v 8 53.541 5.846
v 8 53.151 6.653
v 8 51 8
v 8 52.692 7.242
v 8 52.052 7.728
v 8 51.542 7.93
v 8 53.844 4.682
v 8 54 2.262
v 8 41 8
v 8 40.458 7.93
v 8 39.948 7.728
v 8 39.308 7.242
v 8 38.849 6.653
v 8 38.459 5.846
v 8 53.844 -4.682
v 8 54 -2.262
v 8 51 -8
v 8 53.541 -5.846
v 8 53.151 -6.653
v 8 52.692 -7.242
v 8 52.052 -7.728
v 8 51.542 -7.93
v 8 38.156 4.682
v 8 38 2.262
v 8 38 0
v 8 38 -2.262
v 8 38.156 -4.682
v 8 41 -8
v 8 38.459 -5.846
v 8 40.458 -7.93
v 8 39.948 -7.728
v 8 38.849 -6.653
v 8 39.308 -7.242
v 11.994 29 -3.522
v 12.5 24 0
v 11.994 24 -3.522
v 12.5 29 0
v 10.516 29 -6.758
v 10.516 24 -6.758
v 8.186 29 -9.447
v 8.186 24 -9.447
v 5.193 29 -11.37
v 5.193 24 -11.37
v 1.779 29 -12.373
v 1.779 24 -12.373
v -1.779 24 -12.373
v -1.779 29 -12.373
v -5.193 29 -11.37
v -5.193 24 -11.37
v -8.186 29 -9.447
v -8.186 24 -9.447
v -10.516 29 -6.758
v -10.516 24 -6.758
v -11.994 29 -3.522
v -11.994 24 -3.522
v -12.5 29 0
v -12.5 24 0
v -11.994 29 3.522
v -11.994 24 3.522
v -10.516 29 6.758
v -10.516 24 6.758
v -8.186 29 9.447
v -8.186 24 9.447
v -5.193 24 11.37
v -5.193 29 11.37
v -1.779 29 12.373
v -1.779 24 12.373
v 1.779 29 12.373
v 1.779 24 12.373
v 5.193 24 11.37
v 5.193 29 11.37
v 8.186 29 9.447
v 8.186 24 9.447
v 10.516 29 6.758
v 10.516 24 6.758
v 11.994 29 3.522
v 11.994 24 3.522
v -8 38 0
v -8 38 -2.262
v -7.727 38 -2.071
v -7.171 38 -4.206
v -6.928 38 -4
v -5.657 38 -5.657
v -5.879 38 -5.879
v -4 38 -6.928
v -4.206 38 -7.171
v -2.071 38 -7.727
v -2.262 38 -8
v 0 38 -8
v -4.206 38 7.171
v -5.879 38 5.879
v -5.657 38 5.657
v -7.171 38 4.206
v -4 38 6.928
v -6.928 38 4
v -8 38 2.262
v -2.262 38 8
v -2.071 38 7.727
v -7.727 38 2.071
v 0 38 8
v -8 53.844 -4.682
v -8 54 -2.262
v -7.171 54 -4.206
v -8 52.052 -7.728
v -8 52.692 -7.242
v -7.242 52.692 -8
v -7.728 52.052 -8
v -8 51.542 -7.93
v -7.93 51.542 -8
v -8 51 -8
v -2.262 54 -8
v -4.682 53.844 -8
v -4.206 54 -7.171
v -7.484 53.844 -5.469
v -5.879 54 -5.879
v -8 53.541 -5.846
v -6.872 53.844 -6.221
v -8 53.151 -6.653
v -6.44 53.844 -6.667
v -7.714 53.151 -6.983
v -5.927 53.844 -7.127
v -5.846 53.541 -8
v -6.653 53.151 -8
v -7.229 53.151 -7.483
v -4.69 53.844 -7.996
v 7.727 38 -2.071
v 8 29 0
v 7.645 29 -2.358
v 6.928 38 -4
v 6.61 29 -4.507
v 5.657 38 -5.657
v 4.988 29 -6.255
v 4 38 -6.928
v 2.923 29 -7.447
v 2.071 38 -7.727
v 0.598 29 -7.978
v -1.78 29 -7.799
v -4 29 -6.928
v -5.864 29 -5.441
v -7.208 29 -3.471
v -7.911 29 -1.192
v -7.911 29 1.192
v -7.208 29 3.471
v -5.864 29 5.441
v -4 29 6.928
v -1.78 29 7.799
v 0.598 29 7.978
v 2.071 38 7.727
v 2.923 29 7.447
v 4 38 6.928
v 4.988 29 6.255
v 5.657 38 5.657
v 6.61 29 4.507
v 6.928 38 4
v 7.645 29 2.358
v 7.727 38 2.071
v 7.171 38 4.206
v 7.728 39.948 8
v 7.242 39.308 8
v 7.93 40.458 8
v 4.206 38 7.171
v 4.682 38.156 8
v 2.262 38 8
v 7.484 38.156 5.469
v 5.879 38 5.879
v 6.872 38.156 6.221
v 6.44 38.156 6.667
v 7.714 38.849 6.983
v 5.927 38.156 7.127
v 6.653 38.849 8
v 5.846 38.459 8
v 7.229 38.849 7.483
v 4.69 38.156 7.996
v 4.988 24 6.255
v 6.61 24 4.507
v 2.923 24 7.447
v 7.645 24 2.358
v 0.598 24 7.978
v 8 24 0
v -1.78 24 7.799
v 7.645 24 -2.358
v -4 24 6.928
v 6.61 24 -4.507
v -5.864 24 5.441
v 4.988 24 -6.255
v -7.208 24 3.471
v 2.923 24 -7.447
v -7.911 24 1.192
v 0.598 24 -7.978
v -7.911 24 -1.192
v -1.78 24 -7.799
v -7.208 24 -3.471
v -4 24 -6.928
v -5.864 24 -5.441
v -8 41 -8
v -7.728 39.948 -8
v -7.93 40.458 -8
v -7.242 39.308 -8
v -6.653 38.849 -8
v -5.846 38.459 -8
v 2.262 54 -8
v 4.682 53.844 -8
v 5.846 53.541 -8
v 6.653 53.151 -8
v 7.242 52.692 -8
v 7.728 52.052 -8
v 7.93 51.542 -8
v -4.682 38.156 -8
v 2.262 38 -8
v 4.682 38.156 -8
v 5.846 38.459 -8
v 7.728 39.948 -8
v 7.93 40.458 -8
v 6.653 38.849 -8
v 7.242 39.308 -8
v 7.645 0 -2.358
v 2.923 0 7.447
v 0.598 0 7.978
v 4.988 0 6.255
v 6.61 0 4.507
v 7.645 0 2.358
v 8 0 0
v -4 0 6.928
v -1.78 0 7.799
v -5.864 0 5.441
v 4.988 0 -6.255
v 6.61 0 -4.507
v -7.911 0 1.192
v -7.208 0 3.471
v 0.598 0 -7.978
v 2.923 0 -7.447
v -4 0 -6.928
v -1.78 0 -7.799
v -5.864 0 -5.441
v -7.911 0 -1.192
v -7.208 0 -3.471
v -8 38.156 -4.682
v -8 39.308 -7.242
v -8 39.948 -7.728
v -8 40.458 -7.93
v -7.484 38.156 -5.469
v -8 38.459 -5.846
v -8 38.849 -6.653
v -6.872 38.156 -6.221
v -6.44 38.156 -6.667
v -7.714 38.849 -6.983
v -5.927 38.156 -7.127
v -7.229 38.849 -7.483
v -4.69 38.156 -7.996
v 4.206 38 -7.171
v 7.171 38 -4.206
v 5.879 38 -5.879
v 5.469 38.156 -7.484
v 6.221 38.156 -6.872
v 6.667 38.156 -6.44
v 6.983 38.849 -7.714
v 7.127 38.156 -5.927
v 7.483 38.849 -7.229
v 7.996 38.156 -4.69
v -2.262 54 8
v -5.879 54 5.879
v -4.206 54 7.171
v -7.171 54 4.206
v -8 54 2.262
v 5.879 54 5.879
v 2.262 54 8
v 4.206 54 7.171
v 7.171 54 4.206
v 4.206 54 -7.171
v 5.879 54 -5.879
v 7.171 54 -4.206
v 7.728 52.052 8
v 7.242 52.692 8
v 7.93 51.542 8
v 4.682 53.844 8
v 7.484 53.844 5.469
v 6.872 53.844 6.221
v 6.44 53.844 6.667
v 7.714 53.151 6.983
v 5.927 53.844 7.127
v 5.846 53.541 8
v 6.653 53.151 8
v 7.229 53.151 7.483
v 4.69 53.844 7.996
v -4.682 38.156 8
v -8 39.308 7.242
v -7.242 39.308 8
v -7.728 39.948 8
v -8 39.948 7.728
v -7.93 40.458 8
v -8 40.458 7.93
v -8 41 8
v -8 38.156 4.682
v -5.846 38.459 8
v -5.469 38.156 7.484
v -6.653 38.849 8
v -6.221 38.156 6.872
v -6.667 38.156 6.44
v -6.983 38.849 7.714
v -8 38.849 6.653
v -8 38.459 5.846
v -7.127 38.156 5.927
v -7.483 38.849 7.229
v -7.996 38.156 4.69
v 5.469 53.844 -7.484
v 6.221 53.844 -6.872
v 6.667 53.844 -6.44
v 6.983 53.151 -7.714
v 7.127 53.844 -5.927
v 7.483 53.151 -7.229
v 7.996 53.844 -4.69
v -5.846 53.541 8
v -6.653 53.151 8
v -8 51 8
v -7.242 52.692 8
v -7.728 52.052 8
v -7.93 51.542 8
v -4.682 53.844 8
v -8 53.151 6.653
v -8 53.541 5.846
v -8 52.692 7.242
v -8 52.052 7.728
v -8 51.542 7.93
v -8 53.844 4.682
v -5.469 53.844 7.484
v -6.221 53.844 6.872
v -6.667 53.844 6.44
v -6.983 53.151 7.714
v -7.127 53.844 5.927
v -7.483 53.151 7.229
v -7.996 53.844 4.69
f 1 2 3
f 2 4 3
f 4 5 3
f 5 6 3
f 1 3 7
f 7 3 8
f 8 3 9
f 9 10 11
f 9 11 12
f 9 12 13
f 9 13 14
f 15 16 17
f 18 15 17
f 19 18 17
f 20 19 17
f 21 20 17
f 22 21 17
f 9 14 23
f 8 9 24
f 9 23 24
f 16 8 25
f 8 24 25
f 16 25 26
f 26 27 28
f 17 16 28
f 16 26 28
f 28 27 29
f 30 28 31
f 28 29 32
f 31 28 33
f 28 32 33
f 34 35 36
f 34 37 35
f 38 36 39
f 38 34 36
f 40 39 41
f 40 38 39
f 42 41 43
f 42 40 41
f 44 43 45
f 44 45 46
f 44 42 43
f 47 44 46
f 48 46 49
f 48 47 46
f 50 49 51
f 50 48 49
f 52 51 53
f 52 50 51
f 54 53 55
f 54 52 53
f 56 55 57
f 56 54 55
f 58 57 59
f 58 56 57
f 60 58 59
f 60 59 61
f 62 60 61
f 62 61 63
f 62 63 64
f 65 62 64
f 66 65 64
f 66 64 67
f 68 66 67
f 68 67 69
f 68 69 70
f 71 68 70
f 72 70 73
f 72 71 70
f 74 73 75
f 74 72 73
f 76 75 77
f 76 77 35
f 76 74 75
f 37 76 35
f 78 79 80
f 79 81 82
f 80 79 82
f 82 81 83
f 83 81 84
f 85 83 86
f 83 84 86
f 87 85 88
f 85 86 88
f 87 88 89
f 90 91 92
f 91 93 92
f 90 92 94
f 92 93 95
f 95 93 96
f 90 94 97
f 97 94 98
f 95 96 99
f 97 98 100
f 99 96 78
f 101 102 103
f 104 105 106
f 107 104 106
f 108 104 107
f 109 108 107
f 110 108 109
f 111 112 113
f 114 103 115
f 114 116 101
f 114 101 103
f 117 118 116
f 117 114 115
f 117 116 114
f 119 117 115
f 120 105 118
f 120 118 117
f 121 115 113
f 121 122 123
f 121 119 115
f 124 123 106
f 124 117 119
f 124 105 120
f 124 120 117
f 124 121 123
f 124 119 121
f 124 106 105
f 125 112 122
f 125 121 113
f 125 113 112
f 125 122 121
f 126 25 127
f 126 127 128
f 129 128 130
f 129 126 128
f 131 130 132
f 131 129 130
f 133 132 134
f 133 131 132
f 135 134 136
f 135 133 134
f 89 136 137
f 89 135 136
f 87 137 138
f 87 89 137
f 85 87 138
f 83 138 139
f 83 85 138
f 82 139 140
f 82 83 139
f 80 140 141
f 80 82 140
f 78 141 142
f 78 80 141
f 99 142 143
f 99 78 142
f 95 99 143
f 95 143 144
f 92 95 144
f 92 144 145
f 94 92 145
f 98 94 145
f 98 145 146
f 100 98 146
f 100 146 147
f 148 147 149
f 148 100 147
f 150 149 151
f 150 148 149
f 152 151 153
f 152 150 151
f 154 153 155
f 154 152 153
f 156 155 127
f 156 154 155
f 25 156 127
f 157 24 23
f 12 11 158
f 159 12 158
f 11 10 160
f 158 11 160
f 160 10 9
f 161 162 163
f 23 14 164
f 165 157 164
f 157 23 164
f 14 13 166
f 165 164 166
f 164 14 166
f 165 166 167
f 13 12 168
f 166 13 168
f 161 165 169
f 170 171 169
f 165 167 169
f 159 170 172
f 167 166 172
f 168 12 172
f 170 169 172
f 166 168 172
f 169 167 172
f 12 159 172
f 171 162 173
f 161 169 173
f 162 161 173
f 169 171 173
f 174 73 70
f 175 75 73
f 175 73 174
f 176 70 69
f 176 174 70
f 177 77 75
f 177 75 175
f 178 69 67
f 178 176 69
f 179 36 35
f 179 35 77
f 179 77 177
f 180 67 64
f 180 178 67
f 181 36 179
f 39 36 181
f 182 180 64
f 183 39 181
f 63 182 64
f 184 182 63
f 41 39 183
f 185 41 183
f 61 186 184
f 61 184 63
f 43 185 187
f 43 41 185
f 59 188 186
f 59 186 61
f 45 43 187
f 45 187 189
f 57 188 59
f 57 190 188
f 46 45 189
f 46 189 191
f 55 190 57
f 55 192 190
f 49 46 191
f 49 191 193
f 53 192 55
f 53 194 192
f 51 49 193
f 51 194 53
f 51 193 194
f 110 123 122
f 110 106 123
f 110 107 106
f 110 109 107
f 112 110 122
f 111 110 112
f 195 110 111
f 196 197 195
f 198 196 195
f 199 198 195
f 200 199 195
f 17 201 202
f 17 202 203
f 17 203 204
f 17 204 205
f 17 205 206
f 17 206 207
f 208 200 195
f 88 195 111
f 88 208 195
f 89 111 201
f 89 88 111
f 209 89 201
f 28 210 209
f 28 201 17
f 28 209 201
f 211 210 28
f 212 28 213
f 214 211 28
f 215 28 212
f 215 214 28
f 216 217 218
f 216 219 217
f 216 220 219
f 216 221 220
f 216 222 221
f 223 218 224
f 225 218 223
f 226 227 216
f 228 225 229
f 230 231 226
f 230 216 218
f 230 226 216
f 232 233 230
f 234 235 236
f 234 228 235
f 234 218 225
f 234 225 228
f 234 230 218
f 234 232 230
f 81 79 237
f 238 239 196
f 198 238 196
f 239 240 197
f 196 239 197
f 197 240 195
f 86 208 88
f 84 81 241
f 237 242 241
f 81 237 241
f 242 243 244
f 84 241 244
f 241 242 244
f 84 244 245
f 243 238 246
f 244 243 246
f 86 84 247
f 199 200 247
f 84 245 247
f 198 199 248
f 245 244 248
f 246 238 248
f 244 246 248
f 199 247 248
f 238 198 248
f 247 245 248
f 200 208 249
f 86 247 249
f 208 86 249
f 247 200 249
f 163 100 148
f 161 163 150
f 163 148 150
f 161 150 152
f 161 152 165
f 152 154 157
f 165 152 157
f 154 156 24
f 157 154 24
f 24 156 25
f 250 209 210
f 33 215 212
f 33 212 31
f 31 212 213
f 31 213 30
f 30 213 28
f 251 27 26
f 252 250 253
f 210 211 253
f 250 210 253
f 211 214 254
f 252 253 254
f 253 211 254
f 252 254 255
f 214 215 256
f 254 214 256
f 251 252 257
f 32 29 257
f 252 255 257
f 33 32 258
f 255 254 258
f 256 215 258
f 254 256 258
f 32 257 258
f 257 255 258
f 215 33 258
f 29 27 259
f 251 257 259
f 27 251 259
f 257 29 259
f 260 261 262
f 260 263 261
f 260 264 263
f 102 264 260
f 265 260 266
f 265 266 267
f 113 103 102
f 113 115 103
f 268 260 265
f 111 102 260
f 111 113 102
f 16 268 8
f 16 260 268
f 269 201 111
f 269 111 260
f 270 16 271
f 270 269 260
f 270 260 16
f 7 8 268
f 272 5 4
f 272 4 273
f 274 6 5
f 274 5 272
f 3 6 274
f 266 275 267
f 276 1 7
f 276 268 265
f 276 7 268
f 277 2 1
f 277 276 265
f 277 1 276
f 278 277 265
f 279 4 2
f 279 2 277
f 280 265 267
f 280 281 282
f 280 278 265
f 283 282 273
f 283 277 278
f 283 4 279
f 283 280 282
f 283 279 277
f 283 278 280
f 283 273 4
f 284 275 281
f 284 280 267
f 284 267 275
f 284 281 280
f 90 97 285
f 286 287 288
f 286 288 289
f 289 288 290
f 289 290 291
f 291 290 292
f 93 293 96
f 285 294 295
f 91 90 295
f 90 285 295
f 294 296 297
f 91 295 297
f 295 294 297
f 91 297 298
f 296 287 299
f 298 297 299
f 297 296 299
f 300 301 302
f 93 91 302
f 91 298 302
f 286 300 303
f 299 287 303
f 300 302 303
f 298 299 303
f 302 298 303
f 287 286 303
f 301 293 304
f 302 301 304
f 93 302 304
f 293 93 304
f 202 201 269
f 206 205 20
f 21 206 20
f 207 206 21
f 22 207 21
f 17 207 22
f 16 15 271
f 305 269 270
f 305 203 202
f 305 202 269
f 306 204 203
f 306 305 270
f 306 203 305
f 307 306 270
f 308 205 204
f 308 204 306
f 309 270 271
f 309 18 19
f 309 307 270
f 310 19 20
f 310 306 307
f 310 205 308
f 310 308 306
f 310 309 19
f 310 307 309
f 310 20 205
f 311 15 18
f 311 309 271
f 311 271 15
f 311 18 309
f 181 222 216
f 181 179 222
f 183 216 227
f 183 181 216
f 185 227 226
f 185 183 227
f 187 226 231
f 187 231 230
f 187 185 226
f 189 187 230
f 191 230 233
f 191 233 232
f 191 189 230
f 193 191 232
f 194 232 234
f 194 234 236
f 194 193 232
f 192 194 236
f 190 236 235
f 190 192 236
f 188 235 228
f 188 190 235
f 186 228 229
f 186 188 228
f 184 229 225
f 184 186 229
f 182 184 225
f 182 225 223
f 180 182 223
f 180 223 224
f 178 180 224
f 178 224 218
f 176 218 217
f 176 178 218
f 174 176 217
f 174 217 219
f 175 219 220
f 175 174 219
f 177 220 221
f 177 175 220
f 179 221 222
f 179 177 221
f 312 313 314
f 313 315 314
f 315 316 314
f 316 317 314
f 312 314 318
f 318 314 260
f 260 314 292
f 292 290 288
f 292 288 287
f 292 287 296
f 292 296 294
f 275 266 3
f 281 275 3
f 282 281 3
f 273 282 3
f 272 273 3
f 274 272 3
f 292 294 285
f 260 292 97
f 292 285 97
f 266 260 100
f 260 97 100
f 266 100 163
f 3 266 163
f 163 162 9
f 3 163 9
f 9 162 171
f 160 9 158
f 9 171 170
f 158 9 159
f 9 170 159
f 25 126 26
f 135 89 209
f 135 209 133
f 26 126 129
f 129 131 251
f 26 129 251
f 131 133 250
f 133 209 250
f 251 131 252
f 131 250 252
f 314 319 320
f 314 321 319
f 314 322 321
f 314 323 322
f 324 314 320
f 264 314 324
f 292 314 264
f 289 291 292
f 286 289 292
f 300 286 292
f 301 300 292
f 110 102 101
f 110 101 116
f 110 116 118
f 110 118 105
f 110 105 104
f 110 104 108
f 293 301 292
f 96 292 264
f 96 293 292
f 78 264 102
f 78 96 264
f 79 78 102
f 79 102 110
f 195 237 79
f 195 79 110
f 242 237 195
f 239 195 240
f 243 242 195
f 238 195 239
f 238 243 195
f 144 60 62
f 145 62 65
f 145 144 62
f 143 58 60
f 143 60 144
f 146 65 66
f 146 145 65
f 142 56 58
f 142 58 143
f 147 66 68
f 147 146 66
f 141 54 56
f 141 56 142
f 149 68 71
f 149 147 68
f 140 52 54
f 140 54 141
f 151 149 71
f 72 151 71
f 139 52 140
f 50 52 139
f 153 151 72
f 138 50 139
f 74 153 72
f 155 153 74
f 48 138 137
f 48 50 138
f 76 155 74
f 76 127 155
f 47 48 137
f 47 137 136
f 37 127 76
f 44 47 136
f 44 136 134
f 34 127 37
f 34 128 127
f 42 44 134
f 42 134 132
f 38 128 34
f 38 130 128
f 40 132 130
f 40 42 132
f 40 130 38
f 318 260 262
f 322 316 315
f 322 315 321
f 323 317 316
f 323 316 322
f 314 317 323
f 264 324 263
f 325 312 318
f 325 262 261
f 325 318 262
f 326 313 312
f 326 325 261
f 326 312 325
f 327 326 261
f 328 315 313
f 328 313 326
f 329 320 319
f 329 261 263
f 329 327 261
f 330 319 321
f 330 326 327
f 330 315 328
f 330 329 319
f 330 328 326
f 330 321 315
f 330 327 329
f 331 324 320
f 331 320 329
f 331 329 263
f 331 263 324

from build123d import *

# Parameters (mm, degrees)
SKETCH2_W           = 16
SKETCH2_H           = 16
BOSS_EXTRUDE1_DEPTH = 16


with BuildPart() as part:
    # Sketch1 → Revolve1 (revolve)
    with BuildSketch(Plane.XY):
        Polygon((0, 0), (8, 0), (8, 24), (12.5, 24), (12.5, 29), (8, 29), (8, 38), (0, 38), align=None)
    revolve(axis=Axis((0, 0, 0), (0, 1, 0)))

    # Sketch2 → Boss-Extrude1 (add)
    with BuildSketch(Plane(origin=(0, 38, 0), x_dir=(1, 0, 0), z_dir=(0, 1, 0))):
        Rectangle(SKETCH2_W, SKETCH2_H)
    extrude(amount=BOSS_EXTRUDE1_DEPTH)

    # Sketch3 → Cut-Revolve1 (revolve, cut)
    with BuildSketch(Plane(origin=(0, 0, 0), x_dir=(0.707106781, 0, -0.707106781), z_dir=(0.707106781, 0, 0.707106781))):
        with BuildLine():
            Line((11.313708499, 54), (8.313708499, 54))
            ThreePointArc((8.313708499, 54), (10.435028843, 53.121320344), (11.313708499, 51))
            Line((11.313708499, 51), (11.313708499, 54))
        make_face()
        with BuildLine():
            Line((11.313708499, 38), (8.313708499, 38))
            ThreePointArc((8.313708499, 38), (10.435028843, 38.878679656), (11.313708499, 41))
            Line((11.313708499, 41), (11.313708499, 38))
        make_face()
    revolve(axis=Axis((0, 34.971130997, 0), (0, -1, 0)), mode=Mode.SUBTRACT)


solid = part.part
